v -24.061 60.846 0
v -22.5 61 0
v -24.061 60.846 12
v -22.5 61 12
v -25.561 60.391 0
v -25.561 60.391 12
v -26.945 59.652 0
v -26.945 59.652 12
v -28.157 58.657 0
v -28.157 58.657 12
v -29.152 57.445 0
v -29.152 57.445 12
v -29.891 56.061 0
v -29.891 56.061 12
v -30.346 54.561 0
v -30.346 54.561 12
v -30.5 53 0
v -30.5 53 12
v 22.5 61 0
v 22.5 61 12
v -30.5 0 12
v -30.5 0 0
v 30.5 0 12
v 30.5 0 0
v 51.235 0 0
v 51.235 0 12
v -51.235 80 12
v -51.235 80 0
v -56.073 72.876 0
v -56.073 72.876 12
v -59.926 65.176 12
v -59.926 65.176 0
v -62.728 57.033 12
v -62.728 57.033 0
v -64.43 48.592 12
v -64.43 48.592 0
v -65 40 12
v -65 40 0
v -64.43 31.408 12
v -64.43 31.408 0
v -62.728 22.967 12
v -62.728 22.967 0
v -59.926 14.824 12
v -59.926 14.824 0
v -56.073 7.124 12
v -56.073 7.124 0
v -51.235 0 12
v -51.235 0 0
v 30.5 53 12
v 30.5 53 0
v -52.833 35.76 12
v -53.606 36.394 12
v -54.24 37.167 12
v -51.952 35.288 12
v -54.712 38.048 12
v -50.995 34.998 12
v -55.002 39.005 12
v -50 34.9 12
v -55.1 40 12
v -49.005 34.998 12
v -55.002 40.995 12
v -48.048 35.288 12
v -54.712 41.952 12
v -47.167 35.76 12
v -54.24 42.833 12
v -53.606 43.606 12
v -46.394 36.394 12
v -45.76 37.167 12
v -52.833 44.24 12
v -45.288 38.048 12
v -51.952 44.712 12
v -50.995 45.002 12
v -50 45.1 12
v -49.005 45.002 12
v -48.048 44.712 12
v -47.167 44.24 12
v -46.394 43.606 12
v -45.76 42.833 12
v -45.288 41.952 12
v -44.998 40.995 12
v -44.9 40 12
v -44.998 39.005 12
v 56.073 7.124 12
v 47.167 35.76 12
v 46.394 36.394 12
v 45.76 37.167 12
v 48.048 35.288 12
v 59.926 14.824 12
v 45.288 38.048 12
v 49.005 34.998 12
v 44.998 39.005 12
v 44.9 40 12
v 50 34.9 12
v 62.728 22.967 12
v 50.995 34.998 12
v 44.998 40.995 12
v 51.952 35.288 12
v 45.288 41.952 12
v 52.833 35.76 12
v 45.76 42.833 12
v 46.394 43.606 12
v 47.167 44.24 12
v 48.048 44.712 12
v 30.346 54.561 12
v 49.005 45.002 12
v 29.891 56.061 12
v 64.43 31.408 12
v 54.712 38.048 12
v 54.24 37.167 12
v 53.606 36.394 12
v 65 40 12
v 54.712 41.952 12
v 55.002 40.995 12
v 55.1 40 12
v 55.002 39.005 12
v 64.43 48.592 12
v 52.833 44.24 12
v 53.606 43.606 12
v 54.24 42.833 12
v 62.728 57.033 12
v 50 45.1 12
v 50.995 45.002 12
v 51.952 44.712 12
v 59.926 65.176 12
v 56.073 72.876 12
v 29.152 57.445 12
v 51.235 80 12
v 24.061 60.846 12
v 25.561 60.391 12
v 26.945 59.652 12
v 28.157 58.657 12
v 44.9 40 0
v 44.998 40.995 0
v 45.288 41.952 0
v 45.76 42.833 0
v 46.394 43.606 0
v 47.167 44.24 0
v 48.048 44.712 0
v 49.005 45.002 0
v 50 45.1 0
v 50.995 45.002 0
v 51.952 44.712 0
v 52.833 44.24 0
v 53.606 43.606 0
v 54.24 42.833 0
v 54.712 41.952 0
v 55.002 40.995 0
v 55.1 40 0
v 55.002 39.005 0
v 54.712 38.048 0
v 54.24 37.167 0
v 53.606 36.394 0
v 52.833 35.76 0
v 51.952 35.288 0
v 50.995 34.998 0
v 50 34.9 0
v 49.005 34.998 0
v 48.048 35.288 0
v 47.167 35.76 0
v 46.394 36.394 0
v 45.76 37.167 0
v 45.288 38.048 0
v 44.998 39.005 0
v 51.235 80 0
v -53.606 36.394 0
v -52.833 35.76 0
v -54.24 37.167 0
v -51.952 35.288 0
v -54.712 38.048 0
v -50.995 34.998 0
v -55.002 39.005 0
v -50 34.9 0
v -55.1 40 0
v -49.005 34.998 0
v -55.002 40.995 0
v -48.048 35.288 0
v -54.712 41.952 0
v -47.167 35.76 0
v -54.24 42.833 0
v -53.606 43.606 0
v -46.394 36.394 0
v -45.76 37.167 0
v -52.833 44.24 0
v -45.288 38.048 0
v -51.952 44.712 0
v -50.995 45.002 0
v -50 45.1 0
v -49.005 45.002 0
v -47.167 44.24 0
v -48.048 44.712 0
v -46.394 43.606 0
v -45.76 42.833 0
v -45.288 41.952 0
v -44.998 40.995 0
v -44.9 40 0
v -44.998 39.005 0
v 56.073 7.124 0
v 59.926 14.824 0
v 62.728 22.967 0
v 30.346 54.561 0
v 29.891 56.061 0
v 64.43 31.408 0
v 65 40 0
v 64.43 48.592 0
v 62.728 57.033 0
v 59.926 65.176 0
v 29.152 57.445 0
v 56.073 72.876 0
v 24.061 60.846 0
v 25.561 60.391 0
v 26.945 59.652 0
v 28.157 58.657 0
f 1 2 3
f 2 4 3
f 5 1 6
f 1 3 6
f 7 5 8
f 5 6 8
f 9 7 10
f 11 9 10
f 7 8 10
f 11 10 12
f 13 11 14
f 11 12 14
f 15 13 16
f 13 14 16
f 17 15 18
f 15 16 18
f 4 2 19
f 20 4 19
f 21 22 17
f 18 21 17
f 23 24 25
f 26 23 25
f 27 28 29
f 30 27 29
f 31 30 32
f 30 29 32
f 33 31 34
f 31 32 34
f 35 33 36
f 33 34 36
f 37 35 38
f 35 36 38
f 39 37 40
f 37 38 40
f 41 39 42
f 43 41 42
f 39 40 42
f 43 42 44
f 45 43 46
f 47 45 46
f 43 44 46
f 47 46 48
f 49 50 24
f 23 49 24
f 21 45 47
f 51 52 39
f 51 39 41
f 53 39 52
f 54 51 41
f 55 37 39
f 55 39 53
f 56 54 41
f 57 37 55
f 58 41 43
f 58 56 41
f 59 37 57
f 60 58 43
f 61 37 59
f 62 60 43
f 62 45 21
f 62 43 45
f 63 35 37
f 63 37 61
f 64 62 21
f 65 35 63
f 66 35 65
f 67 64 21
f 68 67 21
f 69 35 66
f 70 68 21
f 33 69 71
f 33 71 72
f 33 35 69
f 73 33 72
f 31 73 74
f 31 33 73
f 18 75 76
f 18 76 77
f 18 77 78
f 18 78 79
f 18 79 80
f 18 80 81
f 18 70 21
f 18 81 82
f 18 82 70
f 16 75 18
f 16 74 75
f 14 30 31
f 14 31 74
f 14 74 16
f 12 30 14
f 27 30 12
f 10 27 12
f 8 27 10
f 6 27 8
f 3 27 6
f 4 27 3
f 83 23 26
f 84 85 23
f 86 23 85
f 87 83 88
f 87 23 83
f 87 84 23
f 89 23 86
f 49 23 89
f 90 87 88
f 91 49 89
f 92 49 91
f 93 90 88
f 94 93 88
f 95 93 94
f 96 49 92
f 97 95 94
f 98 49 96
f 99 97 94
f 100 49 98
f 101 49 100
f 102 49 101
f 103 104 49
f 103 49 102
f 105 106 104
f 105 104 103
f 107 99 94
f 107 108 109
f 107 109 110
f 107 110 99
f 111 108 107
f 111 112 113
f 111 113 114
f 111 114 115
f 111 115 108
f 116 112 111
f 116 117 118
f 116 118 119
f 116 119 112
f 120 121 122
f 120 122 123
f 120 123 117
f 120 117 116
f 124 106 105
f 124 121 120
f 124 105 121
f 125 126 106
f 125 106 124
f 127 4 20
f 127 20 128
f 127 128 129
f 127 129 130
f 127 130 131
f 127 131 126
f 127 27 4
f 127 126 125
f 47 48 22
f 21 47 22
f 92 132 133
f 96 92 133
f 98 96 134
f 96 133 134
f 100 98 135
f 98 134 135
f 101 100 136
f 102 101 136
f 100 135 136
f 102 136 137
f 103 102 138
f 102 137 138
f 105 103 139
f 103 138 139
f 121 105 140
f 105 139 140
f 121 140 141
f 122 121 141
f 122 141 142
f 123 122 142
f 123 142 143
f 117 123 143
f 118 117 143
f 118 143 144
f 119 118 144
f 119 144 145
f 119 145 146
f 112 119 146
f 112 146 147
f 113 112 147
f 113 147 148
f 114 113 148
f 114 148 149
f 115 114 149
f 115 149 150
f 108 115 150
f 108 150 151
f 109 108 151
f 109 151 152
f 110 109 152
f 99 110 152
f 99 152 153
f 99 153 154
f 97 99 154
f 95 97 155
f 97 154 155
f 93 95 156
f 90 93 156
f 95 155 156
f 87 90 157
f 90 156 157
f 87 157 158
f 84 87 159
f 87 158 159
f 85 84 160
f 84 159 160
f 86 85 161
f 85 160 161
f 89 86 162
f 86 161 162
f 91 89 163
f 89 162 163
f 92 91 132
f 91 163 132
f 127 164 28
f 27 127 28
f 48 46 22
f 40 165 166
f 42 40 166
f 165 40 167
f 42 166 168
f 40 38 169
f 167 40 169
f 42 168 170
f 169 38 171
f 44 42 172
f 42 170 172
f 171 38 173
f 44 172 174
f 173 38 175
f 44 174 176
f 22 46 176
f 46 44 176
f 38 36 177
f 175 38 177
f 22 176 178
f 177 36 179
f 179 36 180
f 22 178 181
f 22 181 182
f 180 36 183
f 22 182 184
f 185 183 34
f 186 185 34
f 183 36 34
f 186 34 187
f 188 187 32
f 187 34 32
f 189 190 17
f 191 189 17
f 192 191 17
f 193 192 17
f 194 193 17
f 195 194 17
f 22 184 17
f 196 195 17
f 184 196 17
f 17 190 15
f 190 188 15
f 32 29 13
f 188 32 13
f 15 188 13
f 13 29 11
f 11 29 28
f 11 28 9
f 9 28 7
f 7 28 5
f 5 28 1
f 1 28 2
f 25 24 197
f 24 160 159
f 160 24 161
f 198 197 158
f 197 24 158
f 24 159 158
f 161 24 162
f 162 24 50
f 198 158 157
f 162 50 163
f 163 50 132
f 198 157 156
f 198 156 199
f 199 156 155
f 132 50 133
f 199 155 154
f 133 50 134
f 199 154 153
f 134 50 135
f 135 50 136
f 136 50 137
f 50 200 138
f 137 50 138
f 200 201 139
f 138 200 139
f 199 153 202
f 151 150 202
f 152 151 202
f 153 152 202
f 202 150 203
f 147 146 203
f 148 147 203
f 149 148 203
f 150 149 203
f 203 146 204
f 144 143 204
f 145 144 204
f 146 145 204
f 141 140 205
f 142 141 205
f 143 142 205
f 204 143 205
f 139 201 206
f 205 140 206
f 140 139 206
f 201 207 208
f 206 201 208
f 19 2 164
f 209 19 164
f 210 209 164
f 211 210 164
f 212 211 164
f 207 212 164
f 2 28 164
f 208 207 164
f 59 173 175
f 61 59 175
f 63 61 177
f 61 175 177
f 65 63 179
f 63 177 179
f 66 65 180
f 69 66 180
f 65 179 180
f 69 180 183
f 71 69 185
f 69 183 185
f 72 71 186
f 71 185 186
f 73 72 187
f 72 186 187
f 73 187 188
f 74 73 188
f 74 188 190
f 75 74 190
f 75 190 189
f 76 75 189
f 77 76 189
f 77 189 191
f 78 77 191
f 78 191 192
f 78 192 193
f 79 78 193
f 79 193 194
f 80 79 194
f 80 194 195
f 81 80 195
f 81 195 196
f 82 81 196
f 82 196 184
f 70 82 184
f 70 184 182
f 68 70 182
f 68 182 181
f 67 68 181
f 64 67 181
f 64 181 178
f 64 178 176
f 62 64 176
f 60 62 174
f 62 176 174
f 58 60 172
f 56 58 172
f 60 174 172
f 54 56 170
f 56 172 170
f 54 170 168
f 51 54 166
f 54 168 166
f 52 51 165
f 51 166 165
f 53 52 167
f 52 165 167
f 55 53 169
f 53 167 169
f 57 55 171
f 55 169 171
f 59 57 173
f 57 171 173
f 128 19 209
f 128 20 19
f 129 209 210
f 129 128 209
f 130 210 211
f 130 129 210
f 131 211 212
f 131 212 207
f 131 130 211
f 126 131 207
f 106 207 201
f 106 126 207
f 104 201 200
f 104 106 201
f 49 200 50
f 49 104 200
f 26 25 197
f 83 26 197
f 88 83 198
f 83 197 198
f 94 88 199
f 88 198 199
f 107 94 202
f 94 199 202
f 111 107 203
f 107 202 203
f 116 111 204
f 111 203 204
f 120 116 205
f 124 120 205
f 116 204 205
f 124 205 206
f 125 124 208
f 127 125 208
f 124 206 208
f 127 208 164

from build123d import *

# Parameters (mm, degrees)
EXTRUDE_1_DEPTH         = 12
HOLE_WIZARD_M12_2_D     = 10.2
HOLE_WIZARD_M12_2_DEPTH = 32.75
HOLE_WIZARD_M12_2_TIP   = 3.064389157
FILLET_2_R              = 8


with BuildPart() as part:
    # 草图1 → 凸台-拉伸1 (new body)
    with BuildSketch(Plane.XY):
        with BuildLine():
            Line((-30.5, 61), (30.5, 61))
            Line((30.5, 61), (30.5, 0))
            Line((30.5, 0), (51.23475383, 0))
            ThreePointArc((51.23475383, 0), (65, 40), (51.23475383, 80))
            Line((51.23475383, 80), (0, 80))
            Line((0, 80), (-51.23475383, 80))
            ThreePointArc((-51.23475383, 80), (-65, 40), (-51.23475383, 0))
            Line((-51.23475383, 0), (-30.5, 0))
            Line((-30.5, 0), (-30.5, 61))
        make_face()
    extrude(amount=EXTRUDE_1_DEPTH)

    # M12 螺纹孔2
    with Locations(Plane.XY.offset(12)):
        with Locations((-50, 40), (50, 40)):
            Hole(HOLE_WIZARD_M12_2_D / 2, depth=HOLE_WIZARD_M12_2_DEPTH)
            with Locations((0, 0, -(HOLE_WIZARD_M12_2_DEPTH + HOLE_WIZARD_M12_2_TIP / 2))):  # 118° drill point
                Cone(0, HOLE_WIZARD_M12_2_D / 2, HOLE_WIZARD_M12_2_TIP, mode=Mode.SUBTRACT)

    # 圆角2
    fillet_2_edges = [part.edges().sort_by_distance(p)[0] for p in [
        (30.5, 61, 6),
        (-30.5, 61, 6),
    ]]
    fillet(fillet_2_edges, radius=FILLET_2_R)


solid = part.part
